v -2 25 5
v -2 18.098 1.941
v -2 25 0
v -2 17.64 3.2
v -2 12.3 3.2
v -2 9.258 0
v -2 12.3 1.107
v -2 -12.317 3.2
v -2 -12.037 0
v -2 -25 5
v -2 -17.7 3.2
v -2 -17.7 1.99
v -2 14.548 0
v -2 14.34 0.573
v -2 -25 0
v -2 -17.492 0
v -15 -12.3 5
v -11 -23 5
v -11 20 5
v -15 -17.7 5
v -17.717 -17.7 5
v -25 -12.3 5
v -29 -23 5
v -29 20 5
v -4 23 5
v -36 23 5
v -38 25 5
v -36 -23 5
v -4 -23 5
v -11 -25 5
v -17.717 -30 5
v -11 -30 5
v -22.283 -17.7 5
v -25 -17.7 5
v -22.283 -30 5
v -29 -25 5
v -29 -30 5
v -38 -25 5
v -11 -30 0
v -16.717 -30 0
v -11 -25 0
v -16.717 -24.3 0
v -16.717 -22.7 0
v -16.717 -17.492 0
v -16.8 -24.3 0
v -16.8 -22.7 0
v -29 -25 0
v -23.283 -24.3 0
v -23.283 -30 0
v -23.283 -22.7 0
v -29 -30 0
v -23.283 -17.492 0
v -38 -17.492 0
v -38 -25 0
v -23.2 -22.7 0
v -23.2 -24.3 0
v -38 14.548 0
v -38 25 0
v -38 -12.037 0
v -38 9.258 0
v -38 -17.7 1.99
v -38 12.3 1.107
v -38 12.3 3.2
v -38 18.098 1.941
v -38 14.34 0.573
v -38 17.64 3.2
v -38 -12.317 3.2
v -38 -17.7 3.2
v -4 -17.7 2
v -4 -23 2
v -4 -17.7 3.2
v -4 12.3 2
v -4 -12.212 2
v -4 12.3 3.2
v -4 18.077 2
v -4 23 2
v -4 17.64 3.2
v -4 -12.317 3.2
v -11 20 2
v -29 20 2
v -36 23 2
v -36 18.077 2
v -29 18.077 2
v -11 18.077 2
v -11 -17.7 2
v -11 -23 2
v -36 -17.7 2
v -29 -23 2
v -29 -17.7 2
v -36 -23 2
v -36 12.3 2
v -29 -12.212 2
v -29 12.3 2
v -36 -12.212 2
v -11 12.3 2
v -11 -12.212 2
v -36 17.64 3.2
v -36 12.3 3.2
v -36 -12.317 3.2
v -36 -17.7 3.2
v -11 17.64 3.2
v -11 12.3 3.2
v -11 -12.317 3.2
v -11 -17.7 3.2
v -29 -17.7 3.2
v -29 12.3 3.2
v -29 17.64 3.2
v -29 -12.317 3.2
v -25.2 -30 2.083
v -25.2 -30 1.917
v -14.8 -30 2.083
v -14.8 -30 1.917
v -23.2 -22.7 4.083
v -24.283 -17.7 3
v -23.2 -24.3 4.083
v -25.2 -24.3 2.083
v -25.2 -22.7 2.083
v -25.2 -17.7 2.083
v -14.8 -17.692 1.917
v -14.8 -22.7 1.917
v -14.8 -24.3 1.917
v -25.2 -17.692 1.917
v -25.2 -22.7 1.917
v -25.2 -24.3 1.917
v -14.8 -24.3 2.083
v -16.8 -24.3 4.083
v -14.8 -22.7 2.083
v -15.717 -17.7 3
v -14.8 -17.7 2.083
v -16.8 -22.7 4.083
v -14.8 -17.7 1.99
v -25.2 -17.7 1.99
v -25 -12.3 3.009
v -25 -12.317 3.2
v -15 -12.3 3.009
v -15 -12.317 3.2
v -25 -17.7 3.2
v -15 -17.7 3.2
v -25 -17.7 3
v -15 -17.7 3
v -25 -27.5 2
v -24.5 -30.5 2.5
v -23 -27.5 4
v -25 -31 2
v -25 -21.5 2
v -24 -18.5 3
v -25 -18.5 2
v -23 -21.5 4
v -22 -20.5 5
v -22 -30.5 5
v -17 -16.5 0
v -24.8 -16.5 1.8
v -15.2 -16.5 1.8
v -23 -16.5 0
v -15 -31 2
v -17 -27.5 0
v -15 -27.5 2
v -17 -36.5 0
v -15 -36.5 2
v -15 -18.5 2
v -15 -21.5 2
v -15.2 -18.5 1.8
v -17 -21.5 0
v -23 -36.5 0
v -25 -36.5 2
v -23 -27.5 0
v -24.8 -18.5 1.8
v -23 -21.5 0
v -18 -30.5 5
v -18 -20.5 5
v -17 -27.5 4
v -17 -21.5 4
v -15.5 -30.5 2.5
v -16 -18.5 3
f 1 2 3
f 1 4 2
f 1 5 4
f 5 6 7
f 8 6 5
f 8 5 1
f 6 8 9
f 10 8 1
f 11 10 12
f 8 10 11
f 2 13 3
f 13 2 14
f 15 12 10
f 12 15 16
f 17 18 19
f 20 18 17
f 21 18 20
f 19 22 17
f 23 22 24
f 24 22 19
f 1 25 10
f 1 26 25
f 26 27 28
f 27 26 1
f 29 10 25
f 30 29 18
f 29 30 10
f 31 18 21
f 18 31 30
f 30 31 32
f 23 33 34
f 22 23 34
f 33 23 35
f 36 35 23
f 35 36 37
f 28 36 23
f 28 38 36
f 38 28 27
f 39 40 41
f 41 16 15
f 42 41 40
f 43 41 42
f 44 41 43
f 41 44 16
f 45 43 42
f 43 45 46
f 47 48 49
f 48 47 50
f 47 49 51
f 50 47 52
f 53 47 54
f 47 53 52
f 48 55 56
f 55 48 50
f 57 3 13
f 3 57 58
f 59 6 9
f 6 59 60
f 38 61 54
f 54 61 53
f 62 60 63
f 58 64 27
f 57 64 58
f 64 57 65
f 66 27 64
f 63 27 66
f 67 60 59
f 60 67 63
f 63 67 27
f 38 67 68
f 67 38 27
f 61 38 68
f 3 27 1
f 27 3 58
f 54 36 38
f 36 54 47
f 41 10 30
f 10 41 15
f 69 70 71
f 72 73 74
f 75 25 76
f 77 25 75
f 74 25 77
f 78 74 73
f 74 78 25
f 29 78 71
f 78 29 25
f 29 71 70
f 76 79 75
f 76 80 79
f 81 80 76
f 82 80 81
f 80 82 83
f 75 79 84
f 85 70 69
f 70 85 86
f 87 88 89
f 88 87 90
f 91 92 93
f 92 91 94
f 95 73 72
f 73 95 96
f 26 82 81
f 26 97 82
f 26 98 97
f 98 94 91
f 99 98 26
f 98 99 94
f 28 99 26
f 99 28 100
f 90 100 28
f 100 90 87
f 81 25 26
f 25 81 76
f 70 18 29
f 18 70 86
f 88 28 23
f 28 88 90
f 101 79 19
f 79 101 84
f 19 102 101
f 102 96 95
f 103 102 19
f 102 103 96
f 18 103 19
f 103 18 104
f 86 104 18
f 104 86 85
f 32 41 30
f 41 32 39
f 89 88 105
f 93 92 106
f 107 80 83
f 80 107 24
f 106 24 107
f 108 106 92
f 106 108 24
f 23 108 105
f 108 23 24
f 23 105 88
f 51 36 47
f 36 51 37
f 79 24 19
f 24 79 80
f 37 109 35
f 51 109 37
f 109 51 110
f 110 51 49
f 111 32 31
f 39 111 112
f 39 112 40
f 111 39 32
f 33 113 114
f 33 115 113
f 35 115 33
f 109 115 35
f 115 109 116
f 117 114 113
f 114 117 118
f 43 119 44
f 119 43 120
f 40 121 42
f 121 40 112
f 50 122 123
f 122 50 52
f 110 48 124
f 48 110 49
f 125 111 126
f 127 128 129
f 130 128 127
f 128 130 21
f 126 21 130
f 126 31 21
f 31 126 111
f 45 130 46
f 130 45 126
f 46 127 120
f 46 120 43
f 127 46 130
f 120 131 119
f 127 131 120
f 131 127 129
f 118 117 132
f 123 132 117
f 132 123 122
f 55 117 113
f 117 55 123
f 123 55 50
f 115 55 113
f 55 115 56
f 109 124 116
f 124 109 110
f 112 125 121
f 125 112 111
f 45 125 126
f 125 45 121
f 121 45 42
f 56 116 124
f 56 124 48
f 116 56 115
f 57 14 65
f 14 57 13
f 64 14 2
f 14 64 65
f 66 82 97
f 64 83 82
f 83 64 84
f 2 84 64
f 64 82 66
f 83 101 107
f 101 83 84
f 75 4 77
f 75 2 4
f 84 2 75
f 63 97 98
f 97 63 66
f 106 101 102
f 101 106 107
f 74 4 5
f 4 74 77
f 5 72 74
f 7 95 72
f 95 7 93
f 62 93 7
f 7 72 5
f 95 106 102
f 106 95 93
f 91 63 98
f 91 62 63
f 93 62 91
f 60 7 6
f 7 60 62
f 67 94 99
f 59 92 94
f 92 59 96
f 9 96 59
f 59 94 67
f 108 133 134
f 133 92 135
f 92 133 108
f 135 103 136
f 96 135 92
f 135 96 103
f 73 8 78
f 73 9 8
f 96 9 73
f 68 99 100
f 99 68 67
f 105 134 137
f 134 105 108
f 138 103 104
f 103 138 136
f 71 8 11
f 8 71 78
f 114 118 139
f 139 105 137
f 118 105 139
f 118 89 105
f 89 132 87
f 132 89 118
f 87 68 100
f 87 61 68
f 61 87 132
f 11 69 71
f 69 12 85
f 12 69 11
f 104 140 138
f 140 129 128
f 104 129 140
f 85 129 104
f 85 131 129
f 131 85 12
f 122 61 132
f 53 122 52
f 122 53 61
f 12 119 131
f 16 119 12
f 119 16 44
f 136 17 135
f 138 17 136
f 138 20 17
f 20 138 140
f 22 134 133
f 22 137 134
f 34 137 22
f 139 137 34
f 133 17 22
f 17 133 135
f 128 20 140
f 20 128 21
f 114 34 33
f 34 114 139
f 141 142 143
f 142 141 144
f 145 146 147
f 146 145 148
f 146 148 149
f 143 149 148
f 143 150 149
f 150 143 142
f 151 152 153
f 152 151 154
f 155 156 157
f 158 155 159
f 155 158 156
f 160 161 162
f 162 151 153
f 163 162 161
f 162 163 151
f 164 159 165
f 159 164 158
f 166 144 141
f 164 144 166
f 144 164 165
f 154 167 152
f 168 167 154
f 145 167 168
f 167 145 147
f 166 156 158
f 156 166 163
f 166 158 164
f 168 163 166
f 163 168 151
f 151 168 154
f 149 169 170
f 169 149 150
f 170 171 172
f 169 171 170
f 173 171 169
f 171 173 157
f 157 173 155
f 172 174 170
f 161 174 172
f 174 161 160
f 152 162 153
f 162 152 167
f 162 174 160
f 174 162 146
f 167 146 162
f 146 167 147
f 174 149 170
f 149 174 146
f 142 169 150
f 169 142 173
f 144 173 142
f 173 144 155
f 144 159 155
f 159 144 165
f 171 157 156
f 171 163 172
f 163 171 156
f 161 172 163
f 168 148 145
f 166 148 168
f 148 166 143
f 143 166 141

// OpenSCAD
// file: aidutil.scad
// Utility functions for OpenSCAD
// Adrian McCarthy 2021

// These interfaces may change.  No promises.

// GENERAL PURPOSE FUNCTIONS

function front(v) = v[0];
function drop_front(v) = len(v) > 1 ? [ for (i=[1:len(v)-1]) v[i] ] : [];
function back(v)  = v[len(v) - 1];
function drop_back(v)  = len(v) > 1 ? [ for (i=[0:len(v)-2]) v[i] ] : [];

function gcd(a, b) = b == 0 ? a : gcd(b, a%b);

// Just an alias for OpenSCAD's norm.
function magnitude(v) = norm(v);

function mid(a, b) = a + 0.5*(b - a);

// Returns a unit length vector in the same direction.
function normalized(v) =
    let(length = magnitude(v))
        (length != 0) ? 1/length * v : 0 * v;

// Rounds n to a multiple of base.
function round_up(n, base=1) =
    n % base == 0 ? n : floor((n+base)/base)*base;

// TABLE LOOKUP FUNCTIONS
    
function find_row(key, table, low, high) =
  low > high ? undef :
  let(i = round_up(mid(low, high)))
    table[i][0] == key ? table[i] :
    table[i][0] <  key ? find_row(key, table, i+1, high) :
                         find_row(key, table, low, i-1);

function find_params(key, table) =
    find_row(key, table, 0, len(table) - 1);

function remap_key(key, mapping) =
    let(mapped = find_params(key, mapping))
        is_undef(mapped) ? key : mapped[1];

// STRING MANIPULATION FUNCTIONS

// Returns a string consisting of `count` characters of `input` starting at
// `offset`.  If count is not specified, returns the rest of the string (up to
// a limit to prevent runaway recursion).
function substr(input, offset, count=99) =
    count <= 0 ? "" :
    offset >= len(input) ? "" :
    str(input[offset], substr(input, offset+1, count-1));

function trim_head(input) =
  (len(input) > 0 && input[0] == " ") ? trim_head(substr(input, 1)) : input;

function trim_tail(input) =
  let(length = len(input))
    (length > 0 && input[length - 1] == " ") ?
      trim_tail(substr(input, 0, length-1)) : input;

function trim(input) = trim_tail(trim_head(input));

// Returns a vector of the substrings of `input` separated by the specified
// `delimiter`.  The substrings exclude the delimiter itself.
function split(input, delimiter=" ") =
    assert(len(delimiter) == 1)
    let (breaks = [-1, each search(delimiter, input, 0)[0], len(input)])
        [ for (i=[1:len(breaks)-1])
            let (from = breaks[i-1] + 1, to = breaks[i])
                if (to > from) trim(substr(input, from, to-from)) ];

// Returns a string by concatenating the string versions of the elements of
// the vector `input`.  You can optionally specify a `joiner` to connect the
// elements.
function join(input, joiner="", offset=0) =
    offset >= len(input) ? "" :
    offset == 0 ? str(input[0], join(input, joiner, 1)) :
    str(joiner, input[offset], join(input, joiner, offset+1));

// 2D FUNCTIONS

// Returns coefficients (A, B, C) to represent the line from pt0 to pt1
// in the form Ax + By + C = 0.  (XY plane only!)
function line_coeffs(pt0, pt1) =
    let (rise=pt1.y - pt0.y, run=pt1.x - pt0.x,
         A=rise, B=-run, C=-A*pt0.x - B*pt0.y)
    [A, B, C];

// Returns the distance between a 2D point and a line in (A, B, C) form.
function point_to_line(point, line) =
    abs(line[0]*point.x + line[1]*point.y + line[2]) /
    sqrt(line[0]*line[0] + line[1]*line[1]);

// ROUNDED POLYGONS
// Define a 2D polygon with (x, y, radius) vertices and get a rounded version.

// Add a default radius to all points.
function set_radii(points, r) = [ for (i=points) [i.x, i.y, r] ];

// Returns a copy of just the (x, y) components of an (x, y, radius) list.
// This is useful for rendering the original polygon without rounding, since
// OpenSCAD's polygon won't ignore the third component.
function clear_radii(points)  = [ for (i=points) [i.x, i.y] ];

function remove_adjacent_duplicates(points) = [
    points[0],
    each [for (i = [1:len(points)-2]) if (points[i] != points[i-1]) points[i]],
    each [for (i = len(points)-1) if (points[i] != points[0]) points[i]]
];

// Returns a copy of the vector with additional points mirroring the original
// ones reflected in x.
function mirror_path(points) =
    remove_adjacent_duplicates([
        each points,
        each [ for (j=[1:len(points)]) let(i=len(points)-j)
                   [-points[i].x, points[i].y, points[i][2]] ]
    ]);

// Returns a copy of the vector with a duplicate of the last point at the
// beginning and the first point at the end.  This simplifies indexing the
// previous and next point.
function wrap_path(points) =
    [points[len(points) - 1], each points, points[0]];

// Projects point p to the surface of a circle (or sphere).
function push_to_circumference(p, focus, radius) =
    focus + normalized(p - focus)*radius;

// Recursively generates points on an arc from p1 to p2.  A depth limit avoids
// runaway recursion.  It also stops subdividing once the $fs facet size is
// reached.  Currently, it does not check $fa or $fn.
function arc(focus, r, p1, p2, depth=0) =
    depth >= 8 ? [] :  // prevent runaway recursion
    magnitude(p1-p2) <= $fs ? [] :
        let (midpoint = push_to_circumference(mid(p1, p2), focus, r))
        [
            each arc(focus, r, p1, midpoint, depth=depth+1),
            midpoint,
            each arc(focus, r, midpoint, p2, depth=depth+1)
        ];

// Given a polygon in (x, y, radius) form, it computes the parameters necessary
// to generate the arcs to round off the corners.
function compute_arcs(points) =
    let (path = wrap_path(points)) [
        for (i = [1:len(path)-2])
            let (
                A = [path[i-1].x, path[i-1].y],  // adjacent vertex
                B = [path[i].x, path[i].y],      // current vertex
                C = [path[i+1].x, path[i+1].y],  // adjacent vertex
                r = is_undef(path[i][2]) ? 0 : path[i][2], // radius of arc

                // Ahat and Chat are unit vectors pointing from B toward
                // vertices A and C, respectively.
                Ahat = normalized(A - B),
                Chat = normalized(C - B),
        
                // Fhat points from B, bisecting the angle formed by AB and CB.
                Fhat = normalized(Ahat + Chat),

                // Theta is the half-angle between the sides meeting at B.
                // The dot product of unit vectors is equal to the cosine of
                // the angle between them.
                costheta = Fhat*Ahat,
        
                // Since a half-angle is 180 degrees or less, the sine of
                // theta is non-negative.
                sintheta = sqrt(1 - costheta*costheta),

                // Compute F, the focus (center) of the circle needed to make
                // the arc.
                offset = r / sintheta,
                F = B + offset*Fhat,
                
                // Aprime and Cprime are the points at which the corresponding
                // sides of the polygon are tangent to a circle of radius r at F.
                Aprime = B + offset*costheta*Ahat, // endpoints of the arc
                Cprime = B + offset*costheta*Chat
            )
            // If sintheta is 0, this point is colinear with its neighbors.
            // We'll skip generating a straight arc for it.
            if (sintheta != 0) [ F, r, Aprime, Cprime ]
    ];

// Given a list of (x, y, radius) points, this returns a corresponding list of
// (x, y) points that represent the rounded version of the polygon.  The
// result can be passed directly to OpenSCAD's polygon.
function rounded_polygon(points) = [
    for (a = compute_arcs(points))
        let (F = a[0], r = a[1], Aprime = a[2], Cprime = a[3])
            each [ Aprime, each arc(F, r, Aprime, Cprime), Cprime]
];


// GENERAL MODULES

// Union, difference, or intersection selected by parameter.
module udi(option="u") {
    if (option == "i" && $children > 1) {
        intersection() { children([0]); children([1:$children-1]); }
    } else if (option == "d" && $children > 1) {
        difference() { children([0]); children([1:$children-1]); }
    } else {
        union() children();
    }
}
// main file
// DIN rail mount
// Adrian McCarthy 2022-06-09

// NOT READY FOR RE-USE

// A generalized version of code I wrote for wire_spool_holder.scad.

use <aidutil.scad>

// Modifies almost any widget (provided as children to the invocation of
// this module) to make it mountable to 35mm "top-hat" style DIN rail
// (IEC/EN 60715).  This should work with either the 7.5 or 15 mm depth.
module AD_din_rail_profile(depth=7.5) {
    back_x = 0;
    front_x = back_x - depth;
    top_y = 35/2;
    bend_y = top_y - 5;
    th = 1;
    points = [
        [back_x - th,   bend_y],
        [front_x,       bend_y],
        [front_x,       top_y],
        [front_x + th,  top_y],
        [front_x + th,  bend_y + th],
        [back_x,        bend_y + th],
    
        [back_x,        -(bend_y + th)],
        [front_x + th,  -(bend_y + th)],
        [front_x + th,  -(top_y)],
        [front_x,       -(top_y)],
        [front_x,       -(bend_y)],
        [back_x - th,   -(bend_y)]
    ];
    polygon(points);
}

module AD_din_rail(length=100, depth=7.5, center=false) {
    assert(depth == 7.5 || depth == 15,
           "AD: 35mm top hat rail must be 7.5 or 15 mm deep");

    // Actual slot patterns vary by manufacturer and model.
    module slots(length, slot_d=4.5, slot_l=12, slot_interval=20) {

        module slot(d, l) {
            dx = (l - d) / 2;
            rotate([0, 90, 0])
            linear_extrude(depth, convexity=4, center=true)
            hull() {
                translate([ dx, 0, 0]) circle(d=d, $fs=0.2);
                translate([-dx, 0, 0]) circle(d=d, $fs=0.2);
            }
        }

        for (z = [slot_interval/2:slot_interval:length/2]) {
            translate([0, 0,  z]) slot(slot_d, slot_l);
            translate([0, 0, -z]) slot(slot_d, slot_l);
        }
    }

    translate([0, 0, center ? 0 : length/2])
    difference() {
        linear_extrude(length, convexity=4, center=true)
            AD_din_rail_profile(depth=depth);
        slots(length);
    }
}

module AD_din_rail_mountable(depth=7.5, nozzle_d=0.4) {
    unit_width = 18;  // per Wikipedia
    
    // The cutout is the envelope of a rail twisted and slid
    // out of the bottom of the widget.
    module din_cutout(length=250, center=false) {
        translate([0, 0, center ? 0 : length/2])
        linear_extrude(length, convexity=4, center=true) {
            // the twist
            offset(delta=nozzle_d/2) projection() 
                translate([-depth, 35/2, 0])
                    linear_extrude(10, twist=-20)
                        translate([depth, -35/2])
                            AD_din_rail_profile(depth=depth);
            // the slide
            translate([-depth, 35/2, 0])
                for (i = [0:1:10])
                    rotate([0, 0, 20]) translate([0, -i])
                        translate([depth, -35/2])
                            AD_din_rail_profile(depth=depth);
        }
    }
    
    module slide_clip_profile() {
        profile = 
        polygon(profile);
    }
    
    module slide_clip(grip=10, delta=0) {
        extent = -(14 + grip);
        intersection() {
            // the end of the clip
            linear_extrude(20, convexity=10)
                offset(delta=delta)
                    polygon([
                        [-3,  0],
                        [-5,  2],
                        [-2,  5],
                        [ 2,  5],
                        [ 5,  2],
                        [ 3,  0]
                    ]);

            // the side of the clip
            translate([-7, 0, 0]) rotate([0, 90, 0])
            linear_extrude(14, convexity=4)
                offset(delta=delta)
                    polygon([
                        [ 0,  2-nozzle_d/2],
                        [ 0,  0],
                        [extent, 0],
                        [extent, 2],
                        [-14.5, 2],
                        [-14, 2.5],
                        [-14, 5],
                        [-4, 5],
                        [-2, 3],
                        [-2, 2-nozzle_d/2]
                    ]);

            // the top of the clip
            rotate([-90, 0, 0])
            linear_extrude(5, convexity=4)
                offset(delta=delta)
                    polygon([
                        [ -5,   0 ],
                        [ -5,  -5 ],
                        [ -3,  -5 ],
                        [ -3, -11 ],
                        [ -5, -11 ],
                        [ -5, extent ],
                        [  5, extent ],
                        [  5, -11 ],
                        [  3, -11 ],
                        [  3,  -5 ],
                        [  5,  -5 ],
                        [  5,   0 ]
                    ]);

        }
    }

    difference() {
        // Ensure the widget has enough material to span the rail
        union() {
            children();
            translate([-unit_width/2, -60/2, 0]) cube([unit_width, 50, 5]);
        }
        // Cut out notches for the rails to pass through.
        translate([0, 0, -(depth-3)]) rotate([0, 90, 0])
            din_cutout(length=100, center=true);
        
        // Make room for the slide clip to slide.
        for (dy = [0:1:4])
            translate([0, -35/2 + dy, 0]) rotate([90, 0, 0])
                slide_clip(delta=nozzle_d/2);

        // Remove the center of the bridge over the lower rail to avoid
        // sagging that could interfere with a tight fit.
        translate([0, -(35-5)/2, 5]) cube([10, 5+nozzle_d, 4], center=true);
    }
    translate([0, -35/2 + 1, 0]) rotate([90, 0, 0])
        slide_clip();
    
}
    
module widget1() {
    translate([0, 0, 5/2]) difference() {
        cube([36, 50, 5], center=true);
        translate([0, 0, 2]) cube([36-4, 50-4, 5], center=true);
    }
}

module widget2() {
    intersection() {
        translate([0, 0, 10]) sphere(r=15);
        translate([0, 0, 15]) cube(2*15, center=true);
    }
}

din_depth = 7.5;
//AD_din_rail_profile(depth=din_depth);
//AD_din_rail(depth=din_depth, center=true);
color("green")
translate([-20, 0, 0])
AD_din_rail_mountable(depth=din_depth) {
    widget1();
}

if (false) {
color("yellow") translate([20, 0, 0]) AD_din_rail_mountable(depth=din_depth) { widget2(); }


color("yellow") translate([-5.1, -35, 0]) difference() {
    cube([10.2, 20, 7]);
    translate([-1, 4.5, 3.8]) cube([10.2+2, 22, 1.4]);
    translate([-1, 17, 1.8]) cube([10.2+2, 5, 2.2]);
}
}


if ($preview) {
    translate([0, 0, -(din_depth - 3)]) rotate([0, 90, 0])
        AD_din_rail(center=true);
}
